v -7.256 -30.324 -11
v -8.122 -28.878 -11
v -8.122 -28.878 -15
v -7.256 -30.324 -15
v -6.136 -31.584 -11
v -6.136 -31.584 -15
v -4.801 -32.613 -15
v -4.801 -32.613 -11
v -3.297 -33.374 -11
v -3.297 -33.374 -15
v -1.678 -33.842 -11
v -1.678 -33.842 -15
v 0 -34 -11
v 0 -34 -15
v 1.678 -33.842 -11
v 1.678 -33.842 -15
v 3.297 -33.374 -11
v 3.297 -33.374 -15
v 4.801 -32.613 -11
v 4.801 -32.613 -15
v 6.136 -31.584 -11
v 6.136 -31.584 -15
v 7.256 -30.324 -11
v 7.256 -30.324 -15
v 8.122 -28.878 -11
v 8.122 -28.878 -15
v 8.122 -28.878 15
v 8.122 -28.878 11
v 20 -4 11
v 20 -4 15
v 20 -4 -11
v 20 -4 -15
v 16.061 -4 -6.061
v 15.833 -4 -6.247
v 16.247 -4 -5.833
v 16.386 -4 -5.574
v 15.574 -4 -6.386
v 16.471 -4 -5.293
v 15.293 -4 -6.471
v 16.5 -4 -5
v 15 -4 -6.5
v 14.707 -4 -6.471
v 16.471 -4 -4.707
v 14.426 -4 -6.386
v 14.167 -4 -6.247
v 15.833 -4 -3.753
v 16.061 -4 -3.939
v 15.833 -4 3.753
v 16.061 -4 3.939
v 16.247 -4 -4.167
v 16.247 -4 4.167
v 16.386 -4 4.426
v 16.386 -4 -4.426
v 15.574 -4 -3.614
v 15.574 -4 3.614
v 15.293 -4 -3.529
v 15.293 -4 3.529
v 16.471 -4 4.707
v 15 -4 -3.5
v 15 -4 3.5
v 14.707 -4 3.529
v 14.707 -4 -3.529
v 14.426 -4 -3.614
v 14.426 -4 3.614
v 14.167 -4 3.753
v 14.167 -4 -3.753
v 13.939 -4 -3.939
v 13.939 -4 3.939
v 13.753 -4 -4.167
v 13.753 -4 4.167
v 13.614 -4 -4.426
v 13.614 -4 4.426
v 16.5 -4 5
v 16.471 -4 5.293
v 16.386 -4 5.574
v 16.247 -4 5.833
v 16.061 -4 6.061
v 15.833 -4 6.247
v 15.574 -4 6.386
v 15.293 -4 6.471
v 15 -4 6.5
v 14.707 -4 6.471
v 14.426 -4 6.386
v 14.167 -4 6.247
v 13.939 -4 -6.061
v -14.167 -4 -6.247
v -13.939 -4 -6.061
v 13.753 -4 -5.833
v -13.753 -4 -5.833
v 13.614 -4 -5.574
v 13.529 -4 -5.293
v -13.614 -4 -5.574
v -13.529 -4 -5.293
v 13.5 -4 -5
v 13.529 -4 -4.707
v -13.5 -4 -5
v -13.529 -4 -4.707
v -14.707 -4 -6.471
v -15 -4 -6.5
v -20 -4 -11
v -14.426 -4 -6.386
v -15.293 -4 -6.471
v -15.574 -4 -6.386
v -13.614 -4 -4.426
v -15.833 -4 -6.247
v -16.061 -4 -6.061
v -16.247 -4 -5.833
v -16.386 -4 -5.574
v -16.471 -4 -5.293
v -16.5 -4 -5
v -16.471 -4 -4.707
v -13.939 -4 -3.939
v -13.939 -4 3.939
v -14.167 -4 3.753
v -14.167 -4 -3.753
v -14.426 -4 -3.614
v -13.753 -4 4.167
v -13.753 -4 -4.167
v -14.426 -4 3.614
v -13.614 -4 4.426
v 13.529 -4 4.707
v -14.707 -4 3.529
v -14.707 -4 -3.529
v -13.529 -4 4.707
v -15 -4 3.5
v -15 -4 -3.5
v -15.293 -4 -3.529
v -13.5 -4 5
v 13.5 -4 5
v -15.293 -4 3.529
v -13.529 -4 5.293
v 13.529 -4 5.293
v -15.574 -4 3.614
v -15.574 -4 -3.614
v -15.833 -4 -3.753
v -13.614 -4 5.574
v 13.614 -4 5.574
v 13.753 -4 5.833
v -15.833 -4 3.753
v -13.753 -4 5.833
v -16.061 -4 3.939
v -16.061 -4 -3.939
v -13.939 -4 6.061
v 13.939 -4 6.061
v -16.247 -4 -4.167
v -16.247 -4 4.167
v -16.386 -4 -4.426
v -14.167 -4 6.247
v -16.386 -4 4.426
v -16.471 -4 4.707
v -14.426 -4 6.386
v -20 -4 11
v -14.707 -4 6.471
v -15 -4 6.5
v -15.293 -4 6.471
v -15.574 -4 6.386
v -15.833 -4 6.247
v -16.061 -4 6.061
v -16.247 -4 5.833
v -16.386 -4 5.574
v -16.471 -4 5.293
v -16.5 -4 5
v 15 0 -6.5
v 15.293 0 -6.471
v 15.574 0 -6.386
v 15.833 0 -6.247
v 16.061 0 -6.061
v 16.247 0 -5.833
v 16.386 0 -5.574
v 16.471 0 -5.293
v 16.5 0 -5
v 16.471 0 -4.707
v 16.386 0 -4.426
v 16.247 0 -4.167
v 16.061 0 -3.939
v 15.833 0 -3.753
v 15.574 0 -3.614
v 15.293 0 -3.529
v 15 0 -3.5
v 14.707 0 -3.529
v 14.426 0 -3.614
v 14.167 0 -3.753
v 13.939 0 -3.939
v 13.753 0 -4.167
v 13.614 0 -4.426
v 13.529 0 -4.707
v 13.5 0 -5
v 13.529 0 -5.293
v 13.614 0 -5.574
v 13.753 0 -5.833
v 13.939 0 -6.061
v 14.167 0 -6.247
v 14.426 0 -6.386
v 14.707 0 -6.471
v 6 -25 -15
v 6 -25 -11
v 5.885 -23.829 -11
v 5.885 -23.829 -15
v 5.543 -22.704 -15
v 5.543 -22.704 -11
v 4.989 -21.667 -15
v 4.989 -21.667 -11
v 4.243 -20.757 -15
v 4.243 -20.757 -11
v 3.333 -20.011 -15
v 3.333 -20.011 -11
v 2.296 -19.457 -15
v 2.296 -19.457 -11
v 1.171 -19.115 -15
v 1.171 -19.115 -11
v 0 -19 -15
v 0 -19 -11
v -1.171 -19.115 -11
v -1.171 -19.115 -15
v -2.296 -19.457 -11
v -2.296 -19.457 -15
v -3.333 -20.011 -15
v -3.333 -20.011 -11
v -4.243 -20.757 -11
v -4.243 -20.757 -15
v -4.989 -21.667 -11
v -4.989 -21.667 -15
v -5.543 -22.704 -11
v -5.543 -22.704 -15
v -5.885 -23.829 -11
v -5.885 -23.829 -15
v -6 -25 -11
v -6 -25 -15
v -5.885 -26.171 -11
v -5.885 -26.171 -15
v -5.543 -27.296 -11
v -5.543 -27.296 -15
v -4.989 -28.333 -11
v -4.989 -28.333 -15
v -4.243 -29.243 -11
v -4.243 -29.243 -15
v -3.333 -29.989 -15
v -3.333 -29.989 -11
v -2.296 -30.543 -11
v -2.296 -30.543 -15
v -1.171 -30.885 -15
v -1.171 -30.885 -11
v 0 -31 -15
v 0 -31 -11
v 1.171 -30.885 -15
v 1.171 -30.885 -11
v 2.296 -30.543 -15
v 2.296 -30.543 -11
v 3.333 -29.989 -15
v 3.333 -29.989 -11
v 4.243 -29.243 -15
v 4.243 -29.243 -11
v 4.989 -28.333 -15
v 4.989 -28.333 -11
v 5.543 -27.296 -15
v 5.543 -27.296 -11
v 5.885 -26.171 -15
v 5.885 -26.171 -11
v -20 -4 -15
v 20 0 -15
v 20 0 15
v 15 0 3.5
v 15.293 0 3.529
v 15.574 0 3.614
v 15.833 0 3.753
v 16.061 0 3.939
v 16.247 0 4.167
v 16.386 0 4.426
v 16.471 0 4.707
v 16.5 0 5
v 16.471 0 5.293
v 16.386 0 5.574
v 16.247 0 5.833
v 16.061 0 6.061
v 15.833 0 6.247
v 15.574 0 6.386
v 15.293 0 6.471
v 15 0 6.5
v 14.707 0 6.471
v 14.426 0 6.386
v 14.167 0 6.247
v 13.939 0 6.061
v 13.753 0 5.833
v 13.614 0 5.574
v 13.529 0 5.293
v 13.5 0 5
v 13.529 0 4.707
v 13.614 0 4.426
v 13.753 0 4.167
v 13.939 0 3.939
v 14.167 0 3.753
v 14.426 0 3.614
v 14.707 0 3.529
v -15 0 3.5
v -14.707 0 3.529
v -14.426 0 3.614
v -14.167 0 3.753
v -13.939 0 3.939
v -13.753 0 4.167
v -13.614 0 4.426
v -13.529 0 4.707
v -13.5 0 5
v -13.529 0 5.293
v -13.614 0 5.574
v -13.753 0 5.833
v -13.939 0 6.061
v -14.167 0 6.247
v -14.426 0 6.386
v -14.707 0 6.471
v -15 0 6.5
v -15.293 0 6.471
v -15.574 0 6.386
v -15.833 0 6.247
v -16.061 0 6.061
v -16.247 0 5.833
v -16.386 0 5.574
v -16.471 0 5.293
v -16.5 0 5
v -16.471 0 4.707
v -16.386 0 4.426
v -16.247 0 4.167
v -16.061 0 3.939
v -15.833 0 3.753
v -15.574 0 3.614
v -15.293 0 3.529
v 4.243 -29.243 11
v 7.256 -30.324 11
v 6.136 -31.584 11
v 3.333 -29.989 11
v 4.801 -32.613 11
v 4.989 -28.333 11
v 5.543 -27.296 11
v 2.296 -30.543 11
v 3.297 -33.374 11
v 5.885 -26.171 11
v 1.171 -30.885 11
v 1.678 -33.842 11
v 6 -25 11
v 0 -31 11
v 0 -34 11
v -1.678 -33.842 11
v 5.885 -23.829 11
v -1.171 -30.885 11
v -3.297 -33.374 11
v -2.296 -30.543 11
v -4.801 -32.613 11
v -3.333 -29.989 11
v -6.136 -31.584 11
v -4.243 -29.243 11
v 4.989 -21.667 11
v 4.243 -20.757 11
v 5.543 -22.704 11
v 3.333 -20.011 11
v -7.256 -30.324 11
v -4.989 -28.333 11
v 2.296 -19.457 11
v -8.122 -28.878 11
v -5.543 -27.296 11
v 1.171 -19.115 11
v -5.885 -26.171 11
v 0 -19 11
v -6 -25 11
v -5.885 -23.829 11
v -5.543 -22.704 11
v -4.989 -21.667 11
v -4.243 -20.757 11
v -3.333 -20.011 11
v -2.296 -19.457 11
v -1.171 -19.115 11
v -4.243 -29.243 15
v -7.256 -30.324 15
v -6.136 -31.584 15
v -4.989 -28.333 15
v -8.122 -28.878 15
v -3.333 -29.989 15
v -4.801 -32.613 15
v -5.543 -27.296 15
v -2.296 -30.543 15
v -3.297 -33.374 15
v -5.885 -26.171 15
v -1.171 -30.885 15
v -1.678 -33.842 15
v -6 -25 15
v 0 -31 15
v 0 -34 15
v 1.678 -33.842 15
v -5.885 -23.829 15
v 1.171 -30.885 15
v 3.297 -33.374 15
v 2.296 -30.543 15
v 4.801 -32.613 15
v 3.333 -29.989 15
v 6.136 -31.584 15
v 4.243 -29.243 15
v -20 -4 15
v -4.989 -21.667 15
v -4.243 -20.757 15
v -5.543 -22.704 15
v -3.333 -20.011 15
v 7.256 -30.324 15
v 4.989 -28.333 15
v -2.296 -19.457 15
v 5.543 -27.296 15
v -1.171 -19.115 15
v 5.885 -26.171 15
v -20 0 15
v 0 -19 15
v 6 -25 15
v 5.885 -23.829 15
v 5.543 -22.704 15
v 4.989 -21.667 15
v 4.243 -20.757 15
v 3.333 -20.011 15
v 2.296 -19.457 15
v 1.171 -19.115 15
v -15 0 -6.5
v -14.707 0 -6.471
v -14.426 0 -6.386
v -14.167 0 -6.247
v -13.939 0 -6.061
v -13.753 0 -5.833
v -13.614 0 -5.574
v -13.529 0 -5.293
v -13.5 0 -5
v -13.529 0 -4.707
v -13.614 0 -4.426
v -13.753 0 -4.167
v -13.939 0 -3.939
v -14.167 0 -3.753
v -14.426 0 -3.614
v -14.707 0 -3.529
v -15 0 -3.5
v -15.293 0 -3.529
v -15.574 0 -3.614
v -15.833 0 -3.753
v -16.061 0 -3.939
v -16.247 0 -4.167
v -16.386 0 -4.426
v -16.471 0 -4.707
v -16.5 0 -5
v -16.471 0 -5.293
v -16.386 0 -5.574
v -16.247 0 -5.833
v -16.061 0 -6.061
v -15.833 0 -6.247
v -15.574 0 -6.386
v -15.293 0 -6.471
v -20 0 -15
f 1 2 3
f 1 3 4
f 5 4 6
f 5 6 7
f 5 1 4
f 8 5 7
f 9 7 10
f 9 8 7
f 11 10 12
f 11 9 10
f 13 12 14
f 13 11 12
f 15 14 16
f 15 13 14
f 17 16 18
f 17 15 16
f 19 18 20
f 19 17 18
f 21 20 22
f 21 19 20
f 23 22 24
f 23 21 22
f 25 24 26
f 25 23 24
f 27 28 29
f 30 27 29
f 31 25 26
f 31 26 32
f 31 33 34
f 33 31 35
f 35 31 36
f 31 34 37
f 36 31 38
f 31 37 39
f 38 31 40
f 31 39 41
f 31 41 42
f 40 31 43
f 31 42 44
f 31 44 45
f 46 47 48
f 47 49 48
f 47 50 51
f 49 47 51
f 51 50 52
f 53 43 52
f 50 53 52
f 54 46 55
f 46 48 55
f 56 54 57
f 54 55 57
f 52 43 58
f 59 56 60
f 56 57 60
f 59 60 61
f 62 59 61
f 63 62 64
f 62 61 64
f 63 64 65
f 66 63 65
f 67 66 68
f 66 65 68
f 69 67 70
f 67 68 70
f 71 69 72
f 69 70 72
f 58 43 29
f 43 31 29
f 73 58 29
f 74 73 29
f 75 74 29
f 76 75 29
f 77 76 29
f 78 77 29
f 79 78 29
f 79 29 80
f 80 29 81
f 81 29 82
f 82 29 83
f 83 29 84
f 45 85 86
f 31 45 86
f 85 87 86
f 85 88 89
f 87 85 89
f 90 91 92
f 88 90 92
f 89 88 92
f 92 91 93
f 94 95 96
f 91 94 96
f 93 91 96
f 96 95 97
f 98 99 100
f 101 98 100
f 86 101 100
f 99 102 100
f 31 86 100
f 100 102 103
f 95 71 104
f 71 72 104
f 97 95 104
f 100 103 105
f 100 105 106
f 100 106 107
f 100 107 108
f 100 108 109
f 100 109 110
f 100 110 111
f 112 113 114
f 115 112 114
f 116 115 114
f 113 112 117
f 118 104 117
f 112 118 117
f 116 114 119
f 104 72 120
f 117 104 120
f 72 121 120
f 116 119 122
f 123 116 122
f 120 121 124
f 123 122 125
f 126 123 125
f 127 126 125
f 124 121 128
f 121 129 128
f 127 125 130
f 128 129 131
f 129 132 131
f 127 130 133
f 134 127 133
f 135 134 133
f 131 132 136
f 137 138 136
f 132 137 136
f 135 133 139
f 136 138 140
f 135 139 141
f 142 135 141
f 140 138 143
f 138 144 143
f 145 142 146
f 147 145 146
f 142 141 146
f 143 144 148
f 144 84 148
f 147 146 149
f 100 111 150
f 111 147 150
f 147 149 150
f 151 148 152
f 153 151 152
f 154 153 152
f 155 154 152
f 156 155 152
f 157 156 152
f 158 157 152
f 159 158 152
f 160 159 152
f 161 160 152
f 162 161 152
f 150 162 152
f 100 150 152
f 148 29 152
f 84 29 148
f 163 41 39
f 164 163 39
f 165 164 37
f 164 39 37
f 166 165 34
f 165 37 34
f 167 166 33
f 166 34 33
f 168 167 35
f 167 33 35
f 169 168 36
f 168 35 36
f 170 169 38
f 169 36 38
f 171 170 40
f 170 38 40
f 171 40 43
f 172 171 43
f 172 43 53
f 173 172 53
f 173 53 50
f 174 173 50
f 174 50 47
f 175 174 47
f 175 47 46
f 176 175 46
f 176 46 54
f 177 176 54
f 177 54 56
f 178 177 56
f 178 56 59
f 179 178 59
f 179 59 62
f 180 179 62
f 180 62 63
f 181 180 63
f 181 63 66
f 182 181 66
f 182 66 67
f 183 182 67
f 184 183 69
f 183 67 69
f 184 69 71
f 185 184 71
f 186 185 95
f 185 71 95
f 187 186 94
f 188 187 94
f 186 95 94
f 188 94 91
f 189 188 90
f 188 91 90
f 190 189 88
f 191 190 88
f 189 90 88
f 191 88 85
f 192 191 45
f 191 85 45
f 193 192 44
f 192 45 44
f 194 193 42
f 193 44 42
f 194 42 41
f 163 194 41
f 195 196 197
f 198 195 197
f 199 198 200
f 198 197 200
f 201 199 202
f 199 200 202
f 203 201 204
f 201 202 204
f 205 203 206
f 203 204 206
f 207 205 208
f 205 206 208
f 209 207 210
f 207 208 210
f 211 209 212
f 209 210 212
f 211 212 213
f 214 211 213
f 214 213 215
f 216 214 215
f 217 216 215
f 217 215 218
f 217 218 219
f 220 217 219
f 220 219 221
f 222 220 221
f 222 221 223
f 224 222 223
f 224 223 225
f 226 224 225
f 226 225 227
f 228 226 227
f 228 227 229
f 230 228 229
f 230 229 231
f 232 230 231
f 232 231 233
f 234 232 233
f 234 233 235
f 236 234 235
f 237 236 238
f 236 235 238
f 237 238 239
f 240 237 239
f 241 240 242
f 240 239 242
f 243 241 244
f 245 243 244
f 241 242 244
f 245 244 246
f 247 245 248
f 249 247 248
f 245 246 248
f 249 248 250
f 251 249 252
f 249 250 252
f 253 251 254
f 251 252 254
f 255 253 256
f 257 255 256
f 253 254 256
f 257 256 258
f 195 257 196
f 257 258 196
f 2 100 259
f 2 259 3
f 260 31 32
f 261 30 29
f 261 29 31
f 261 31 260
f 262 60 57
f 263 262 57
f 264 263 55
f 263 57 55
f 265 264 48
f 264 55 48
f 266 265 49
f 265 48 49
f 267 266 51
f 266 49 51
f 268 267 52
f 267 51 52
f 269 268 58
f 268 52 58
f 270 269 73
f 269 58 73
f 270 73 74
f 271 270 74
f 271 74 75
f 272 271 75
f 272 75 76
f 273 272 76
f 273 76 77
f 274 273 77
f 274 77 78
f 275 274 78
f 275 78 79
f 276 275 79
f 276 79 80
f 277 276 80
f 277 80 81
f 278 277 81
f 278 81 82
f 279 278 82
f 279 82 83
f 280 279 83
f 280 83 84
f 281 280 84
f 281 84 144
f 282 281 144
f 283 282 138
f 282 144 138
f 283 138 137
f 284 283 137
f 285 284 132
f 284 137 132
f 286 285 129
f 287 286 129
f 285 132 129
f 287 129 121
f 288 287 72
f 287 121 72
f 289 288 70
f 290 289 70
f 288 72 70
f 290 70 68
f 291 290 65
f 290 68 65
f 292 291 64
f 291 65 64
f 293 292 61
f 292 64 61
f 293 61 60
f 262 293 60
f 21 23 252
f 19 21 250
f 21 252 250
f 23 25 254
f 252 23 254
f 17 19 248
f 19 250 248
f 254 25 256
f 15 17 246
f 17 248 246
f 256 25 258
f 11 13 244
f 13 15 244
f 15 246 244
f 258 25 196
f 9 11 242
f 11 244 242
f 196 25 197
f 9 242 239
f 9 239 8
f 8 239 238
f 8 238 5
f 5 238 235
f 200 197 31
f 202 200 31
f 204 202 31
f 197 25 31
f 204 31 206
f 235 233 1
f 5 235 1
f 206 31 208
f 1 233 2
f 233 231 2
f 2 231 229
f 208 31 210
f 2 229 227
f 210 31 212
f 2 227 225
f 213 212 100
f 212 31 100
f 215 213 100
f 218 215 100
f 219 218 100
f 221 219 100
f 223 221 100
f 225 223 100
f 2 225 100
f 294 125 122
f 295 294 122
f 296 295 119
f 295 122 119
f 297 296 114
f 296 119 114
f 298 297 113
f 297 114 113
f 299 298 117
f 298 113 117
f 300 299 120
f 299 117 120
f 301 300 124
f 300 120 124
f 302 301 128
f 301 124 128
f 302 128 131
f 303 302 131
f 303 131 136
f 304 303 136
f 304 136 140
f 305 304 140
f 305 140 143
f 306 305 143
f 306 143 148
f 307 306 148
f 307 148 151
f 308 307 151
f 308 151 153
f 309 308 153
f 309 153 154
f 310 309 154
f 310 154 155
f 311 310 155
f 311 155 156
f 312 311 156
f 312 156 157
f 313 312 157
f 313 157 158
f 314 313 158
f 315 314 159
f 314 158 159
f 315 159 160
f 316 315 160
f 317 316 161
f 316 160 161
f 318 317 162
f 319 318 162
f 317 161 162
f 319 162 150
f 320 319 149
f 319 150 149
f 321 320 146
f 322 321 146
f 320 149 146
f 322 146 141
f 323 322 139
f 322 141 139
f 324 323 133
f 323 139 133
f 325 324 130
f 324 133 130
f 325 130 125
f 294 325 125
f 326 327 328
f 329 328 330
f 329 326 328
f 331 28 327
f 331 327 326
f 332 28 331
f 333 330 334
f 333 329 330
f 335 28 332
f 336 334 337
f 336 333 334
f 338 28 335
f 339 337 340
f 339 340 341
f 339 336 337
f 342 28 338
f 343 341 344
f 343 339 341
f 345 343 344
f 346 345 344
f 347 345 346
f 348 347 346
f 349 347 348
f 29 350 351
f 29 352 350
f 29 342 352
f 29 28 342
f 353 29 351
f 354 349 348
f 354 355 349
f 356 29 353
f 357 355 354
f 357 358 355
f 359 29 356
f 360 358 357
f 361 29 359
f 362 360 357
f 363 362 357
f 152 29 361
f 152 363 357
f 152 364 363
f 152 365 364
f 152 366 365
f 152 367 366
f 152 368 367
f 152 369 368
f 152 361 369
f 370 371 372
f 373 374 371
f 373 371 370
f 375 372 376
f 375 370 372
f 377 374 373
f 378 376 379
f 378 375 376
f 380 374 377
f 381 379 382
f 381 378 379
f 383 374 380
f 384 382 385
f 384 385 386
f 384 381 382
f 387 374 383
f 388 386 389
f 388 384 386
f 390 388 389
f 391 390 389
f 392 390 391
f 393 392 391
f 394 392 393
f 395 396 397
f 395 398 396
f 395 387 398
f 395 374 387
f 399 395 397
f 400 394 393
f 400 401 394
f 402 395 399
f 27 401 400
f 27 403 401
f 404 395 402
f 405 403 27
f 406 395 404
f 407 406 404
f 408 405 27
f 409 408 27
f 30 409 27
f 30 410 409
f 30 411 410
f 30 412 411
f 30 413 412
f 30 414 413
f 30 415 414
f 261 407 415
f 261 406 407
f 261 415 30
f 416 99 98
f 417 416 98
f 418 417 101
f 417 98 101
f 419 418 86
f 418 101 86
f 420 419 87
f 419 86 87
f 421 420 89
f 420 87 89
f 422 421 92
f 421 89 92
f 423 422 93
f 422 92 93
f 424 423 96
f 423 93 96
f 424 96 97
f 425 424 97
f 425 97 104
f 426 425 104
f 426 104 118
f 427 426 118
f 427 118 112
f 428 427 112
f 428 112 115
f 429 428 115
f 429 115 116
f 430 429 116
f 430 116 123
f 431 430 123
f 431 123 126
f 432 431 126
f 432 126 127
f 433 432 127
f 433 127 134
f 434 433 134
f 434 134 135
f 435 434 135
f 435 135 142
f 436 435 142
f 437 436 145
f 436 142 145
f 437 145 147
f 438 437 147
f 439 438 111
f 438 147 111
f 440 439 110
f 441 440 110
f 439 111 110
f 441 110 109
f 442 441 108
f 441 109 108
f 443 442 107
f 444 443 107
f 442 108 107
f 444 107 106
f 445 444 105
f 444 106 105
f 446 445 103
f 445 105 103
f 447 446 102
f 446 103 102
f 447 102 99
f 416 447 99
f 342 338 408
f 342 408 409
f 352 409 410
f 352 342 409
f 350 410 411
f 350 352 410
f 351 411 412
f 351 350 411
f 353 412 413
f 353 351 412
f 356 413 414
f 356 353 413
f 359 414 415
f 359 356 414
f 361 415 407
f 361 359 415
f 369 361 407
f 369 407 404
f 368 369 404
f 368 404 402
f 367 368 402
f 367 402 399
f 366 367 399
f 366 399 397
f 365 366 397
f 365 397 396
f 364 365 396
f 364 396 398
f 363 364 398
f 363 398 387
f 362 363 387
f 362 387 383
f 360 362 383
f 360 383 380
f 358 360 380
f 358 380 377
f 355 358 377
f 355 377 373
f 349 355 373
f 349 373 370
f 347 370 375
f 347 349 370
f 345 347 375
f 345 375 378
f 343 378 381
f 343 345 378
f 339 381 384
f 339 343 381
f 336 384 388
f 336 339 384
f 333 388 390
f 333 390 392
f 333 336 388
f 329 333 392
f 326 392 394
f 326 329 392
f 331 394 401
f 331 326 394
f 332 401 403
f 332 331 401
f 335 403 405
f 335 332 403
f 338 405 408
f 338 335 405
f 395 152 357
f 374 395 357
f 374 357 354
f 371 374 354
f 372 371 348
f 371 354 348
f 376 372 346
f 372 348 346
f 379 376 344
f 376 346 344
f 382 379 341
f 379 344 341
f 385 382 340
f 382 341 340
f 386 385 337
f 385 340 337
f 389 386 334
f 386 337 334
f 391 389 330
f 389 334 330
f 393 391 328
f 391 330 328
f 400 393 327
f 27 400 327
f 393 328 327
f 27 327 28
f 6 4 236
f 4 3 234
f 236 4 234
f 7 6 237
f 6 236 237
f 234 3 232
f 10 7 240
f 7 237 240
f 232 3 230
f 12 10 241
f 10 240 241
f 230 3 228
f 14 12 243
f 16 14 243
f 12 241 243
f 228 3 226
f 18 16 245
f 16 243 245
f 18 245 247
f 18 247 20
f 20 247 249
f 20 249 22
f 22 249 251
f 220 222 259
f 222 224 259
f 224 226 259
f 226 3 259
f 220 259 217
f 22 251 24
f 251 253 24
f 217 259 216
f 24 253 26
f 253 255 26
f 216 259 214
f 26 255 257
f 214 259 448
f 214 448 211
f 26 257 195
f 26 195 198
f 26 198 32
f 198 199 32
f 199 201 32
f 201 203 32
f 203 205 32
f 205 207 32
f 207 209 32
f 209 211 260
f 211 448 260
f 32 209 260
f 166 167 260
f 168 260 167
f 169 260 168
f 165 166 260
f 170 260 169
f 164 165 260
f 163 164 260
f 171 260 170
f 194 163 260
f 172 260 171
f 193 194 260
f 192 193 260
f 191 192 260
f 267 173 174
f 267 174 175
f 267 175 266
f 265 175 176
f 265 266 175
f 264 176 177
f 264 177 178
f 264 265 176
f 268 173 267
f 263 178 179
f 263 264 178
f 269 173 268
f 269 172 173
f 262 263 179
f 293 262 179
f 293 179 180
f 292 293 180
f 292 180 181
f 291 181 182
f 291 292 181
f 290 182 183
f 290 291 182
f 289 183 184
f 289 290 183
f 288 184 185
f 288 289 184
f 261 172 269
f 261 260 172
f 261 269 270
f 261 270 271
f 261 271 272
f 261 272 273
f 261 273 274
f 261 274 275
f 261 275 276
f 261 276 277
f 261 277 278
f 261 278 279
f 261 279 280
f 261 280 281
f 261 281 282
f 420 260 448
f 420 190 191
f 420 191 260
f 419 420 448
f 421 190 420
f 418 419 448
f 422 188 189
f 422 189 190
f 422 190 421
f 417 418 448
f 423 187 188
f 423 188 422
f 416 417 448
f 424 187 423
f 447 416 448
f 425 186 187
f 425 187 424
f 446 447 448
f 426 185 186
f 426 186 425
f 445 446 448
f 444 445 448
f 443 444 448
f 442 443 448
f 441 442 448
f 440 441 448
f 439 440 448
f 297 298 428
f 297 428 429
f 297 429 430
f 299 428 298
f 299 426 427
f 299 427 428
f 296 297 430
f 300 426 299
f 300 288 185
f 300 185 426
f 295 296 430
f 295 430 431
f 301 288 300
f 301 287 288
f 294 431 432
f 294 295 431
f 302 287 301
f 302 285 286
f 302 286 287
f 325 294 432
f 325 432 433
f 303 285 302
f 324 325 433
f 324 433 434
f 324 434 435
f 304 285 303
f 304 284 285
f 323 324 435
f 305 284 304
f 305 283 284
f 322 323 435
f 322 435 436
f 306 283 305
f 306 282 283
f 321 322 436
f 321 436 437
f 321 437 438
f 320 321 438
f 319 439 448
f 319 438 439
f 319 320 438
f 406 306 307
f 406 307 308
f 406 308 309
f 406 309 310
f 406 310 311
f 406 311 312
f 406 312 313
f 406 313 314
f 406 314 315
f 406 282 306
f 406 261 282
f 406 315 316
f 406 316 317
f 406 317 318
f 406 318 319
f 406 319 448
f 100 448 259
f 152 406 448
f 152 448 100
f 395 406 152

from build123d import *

# Parameters (mm, degrees)
SKETCH_1_W          = 40
SKETCH_1_H          = 20
EXTRUDE_1_DEPTH     = 4
SKETCH_2_R          = 6
EXTRUDE_2_DEPTH     = 5
SKETCH_3_W          = 40
SKETCH_3_H          = 35
CUT_EXTRUDE_1_DEPTH = 1
SKETCH_6_R          = 1.5
CUT_EXTRUDE_3_DEPTH = 10


with BuildPart() as part:
    # 草图1 → 凸台-拉伸1 (new body)
    with BuildSketch(Plane(origin=(0, 0, 0), x_dir=(1, 0, 0), z_dir=(0, 1, 0))):
        Rectangle(SKETCH_1_W, SKETCH_1_H)
    extrude(amount=-EXTRUDE_1_DEPTH)

    # 草图2 → 凸台-拉伸2 (add)
    with BuildSketch(Plane.XY.offset(10)):
        with BuildLine():
            Line((20, -4), (20, 0))
            Line((20, 0), (-20, 0))
            Line((-20, 0), (-20, -4))
            Line((-20, -4), (-8.121724647, -28.877832997))
            ThreePointArc((-8.121724647, -28.877832997), (0, -34), (8.121724647, -28.877832997))
            Line((8.121724647, -28.877832997), (20, -4))
        make_face()
        with Locations((0, -25)):
            Circle(SKETCH_2_R, mode=Mode.SUBTRACT)
    extrude_2 = extrude(amount=EXTRUDE_2_DEPTH)

    # 草图3 → 切除-拉伸1 (cut)
    with BuildSketch(Plane(origin=(0, 0, 10), x_dir=(-1, 0, 0), z_dir=(0, 0, -1))):
        with Locations((0, -21.5)):
            Rectangle(SKETCH_3_W, SKETCH_3_H)
    cut_extrude_1 = extrude(amount=-CUT_EXTRUDE_1_DEPTH, mode=Mode.SUBTRACT)

    # 镜向1: 凸台-拉伸2, 切除-拉伸1 across plane
    add(extrude_2.mirror(Plane.XY))
    add(cut_extrude_1.mirror(Plane.XY), mode=Mode.SUBTRACT)

    # 草图6 → 切除-拉伸3 (cut)
    with BuildSketch(Plane.XZ.offset(4)):
        with Locations(Location((-15, 5, 0), (0, 0, 270))):
            Circle(SKETCH_6_R)
        with Locations(Location((15, 5, 0), (0, 0, 270))):
            Circle(SKETCH_6_R)
        with Locations(Location((-15, -5, 0), (0, 0, 270))):
            Circle(SKETCH_6_R)
        with Locations(Location((15, -5, 0), (0, 0, 270))):
            Circle(SKETCH_6_R)
    extrude(amount=-CUT_EXTRUDE_3_DEPTH, mode=Mode.SUBTRACT)


solid = part.part
